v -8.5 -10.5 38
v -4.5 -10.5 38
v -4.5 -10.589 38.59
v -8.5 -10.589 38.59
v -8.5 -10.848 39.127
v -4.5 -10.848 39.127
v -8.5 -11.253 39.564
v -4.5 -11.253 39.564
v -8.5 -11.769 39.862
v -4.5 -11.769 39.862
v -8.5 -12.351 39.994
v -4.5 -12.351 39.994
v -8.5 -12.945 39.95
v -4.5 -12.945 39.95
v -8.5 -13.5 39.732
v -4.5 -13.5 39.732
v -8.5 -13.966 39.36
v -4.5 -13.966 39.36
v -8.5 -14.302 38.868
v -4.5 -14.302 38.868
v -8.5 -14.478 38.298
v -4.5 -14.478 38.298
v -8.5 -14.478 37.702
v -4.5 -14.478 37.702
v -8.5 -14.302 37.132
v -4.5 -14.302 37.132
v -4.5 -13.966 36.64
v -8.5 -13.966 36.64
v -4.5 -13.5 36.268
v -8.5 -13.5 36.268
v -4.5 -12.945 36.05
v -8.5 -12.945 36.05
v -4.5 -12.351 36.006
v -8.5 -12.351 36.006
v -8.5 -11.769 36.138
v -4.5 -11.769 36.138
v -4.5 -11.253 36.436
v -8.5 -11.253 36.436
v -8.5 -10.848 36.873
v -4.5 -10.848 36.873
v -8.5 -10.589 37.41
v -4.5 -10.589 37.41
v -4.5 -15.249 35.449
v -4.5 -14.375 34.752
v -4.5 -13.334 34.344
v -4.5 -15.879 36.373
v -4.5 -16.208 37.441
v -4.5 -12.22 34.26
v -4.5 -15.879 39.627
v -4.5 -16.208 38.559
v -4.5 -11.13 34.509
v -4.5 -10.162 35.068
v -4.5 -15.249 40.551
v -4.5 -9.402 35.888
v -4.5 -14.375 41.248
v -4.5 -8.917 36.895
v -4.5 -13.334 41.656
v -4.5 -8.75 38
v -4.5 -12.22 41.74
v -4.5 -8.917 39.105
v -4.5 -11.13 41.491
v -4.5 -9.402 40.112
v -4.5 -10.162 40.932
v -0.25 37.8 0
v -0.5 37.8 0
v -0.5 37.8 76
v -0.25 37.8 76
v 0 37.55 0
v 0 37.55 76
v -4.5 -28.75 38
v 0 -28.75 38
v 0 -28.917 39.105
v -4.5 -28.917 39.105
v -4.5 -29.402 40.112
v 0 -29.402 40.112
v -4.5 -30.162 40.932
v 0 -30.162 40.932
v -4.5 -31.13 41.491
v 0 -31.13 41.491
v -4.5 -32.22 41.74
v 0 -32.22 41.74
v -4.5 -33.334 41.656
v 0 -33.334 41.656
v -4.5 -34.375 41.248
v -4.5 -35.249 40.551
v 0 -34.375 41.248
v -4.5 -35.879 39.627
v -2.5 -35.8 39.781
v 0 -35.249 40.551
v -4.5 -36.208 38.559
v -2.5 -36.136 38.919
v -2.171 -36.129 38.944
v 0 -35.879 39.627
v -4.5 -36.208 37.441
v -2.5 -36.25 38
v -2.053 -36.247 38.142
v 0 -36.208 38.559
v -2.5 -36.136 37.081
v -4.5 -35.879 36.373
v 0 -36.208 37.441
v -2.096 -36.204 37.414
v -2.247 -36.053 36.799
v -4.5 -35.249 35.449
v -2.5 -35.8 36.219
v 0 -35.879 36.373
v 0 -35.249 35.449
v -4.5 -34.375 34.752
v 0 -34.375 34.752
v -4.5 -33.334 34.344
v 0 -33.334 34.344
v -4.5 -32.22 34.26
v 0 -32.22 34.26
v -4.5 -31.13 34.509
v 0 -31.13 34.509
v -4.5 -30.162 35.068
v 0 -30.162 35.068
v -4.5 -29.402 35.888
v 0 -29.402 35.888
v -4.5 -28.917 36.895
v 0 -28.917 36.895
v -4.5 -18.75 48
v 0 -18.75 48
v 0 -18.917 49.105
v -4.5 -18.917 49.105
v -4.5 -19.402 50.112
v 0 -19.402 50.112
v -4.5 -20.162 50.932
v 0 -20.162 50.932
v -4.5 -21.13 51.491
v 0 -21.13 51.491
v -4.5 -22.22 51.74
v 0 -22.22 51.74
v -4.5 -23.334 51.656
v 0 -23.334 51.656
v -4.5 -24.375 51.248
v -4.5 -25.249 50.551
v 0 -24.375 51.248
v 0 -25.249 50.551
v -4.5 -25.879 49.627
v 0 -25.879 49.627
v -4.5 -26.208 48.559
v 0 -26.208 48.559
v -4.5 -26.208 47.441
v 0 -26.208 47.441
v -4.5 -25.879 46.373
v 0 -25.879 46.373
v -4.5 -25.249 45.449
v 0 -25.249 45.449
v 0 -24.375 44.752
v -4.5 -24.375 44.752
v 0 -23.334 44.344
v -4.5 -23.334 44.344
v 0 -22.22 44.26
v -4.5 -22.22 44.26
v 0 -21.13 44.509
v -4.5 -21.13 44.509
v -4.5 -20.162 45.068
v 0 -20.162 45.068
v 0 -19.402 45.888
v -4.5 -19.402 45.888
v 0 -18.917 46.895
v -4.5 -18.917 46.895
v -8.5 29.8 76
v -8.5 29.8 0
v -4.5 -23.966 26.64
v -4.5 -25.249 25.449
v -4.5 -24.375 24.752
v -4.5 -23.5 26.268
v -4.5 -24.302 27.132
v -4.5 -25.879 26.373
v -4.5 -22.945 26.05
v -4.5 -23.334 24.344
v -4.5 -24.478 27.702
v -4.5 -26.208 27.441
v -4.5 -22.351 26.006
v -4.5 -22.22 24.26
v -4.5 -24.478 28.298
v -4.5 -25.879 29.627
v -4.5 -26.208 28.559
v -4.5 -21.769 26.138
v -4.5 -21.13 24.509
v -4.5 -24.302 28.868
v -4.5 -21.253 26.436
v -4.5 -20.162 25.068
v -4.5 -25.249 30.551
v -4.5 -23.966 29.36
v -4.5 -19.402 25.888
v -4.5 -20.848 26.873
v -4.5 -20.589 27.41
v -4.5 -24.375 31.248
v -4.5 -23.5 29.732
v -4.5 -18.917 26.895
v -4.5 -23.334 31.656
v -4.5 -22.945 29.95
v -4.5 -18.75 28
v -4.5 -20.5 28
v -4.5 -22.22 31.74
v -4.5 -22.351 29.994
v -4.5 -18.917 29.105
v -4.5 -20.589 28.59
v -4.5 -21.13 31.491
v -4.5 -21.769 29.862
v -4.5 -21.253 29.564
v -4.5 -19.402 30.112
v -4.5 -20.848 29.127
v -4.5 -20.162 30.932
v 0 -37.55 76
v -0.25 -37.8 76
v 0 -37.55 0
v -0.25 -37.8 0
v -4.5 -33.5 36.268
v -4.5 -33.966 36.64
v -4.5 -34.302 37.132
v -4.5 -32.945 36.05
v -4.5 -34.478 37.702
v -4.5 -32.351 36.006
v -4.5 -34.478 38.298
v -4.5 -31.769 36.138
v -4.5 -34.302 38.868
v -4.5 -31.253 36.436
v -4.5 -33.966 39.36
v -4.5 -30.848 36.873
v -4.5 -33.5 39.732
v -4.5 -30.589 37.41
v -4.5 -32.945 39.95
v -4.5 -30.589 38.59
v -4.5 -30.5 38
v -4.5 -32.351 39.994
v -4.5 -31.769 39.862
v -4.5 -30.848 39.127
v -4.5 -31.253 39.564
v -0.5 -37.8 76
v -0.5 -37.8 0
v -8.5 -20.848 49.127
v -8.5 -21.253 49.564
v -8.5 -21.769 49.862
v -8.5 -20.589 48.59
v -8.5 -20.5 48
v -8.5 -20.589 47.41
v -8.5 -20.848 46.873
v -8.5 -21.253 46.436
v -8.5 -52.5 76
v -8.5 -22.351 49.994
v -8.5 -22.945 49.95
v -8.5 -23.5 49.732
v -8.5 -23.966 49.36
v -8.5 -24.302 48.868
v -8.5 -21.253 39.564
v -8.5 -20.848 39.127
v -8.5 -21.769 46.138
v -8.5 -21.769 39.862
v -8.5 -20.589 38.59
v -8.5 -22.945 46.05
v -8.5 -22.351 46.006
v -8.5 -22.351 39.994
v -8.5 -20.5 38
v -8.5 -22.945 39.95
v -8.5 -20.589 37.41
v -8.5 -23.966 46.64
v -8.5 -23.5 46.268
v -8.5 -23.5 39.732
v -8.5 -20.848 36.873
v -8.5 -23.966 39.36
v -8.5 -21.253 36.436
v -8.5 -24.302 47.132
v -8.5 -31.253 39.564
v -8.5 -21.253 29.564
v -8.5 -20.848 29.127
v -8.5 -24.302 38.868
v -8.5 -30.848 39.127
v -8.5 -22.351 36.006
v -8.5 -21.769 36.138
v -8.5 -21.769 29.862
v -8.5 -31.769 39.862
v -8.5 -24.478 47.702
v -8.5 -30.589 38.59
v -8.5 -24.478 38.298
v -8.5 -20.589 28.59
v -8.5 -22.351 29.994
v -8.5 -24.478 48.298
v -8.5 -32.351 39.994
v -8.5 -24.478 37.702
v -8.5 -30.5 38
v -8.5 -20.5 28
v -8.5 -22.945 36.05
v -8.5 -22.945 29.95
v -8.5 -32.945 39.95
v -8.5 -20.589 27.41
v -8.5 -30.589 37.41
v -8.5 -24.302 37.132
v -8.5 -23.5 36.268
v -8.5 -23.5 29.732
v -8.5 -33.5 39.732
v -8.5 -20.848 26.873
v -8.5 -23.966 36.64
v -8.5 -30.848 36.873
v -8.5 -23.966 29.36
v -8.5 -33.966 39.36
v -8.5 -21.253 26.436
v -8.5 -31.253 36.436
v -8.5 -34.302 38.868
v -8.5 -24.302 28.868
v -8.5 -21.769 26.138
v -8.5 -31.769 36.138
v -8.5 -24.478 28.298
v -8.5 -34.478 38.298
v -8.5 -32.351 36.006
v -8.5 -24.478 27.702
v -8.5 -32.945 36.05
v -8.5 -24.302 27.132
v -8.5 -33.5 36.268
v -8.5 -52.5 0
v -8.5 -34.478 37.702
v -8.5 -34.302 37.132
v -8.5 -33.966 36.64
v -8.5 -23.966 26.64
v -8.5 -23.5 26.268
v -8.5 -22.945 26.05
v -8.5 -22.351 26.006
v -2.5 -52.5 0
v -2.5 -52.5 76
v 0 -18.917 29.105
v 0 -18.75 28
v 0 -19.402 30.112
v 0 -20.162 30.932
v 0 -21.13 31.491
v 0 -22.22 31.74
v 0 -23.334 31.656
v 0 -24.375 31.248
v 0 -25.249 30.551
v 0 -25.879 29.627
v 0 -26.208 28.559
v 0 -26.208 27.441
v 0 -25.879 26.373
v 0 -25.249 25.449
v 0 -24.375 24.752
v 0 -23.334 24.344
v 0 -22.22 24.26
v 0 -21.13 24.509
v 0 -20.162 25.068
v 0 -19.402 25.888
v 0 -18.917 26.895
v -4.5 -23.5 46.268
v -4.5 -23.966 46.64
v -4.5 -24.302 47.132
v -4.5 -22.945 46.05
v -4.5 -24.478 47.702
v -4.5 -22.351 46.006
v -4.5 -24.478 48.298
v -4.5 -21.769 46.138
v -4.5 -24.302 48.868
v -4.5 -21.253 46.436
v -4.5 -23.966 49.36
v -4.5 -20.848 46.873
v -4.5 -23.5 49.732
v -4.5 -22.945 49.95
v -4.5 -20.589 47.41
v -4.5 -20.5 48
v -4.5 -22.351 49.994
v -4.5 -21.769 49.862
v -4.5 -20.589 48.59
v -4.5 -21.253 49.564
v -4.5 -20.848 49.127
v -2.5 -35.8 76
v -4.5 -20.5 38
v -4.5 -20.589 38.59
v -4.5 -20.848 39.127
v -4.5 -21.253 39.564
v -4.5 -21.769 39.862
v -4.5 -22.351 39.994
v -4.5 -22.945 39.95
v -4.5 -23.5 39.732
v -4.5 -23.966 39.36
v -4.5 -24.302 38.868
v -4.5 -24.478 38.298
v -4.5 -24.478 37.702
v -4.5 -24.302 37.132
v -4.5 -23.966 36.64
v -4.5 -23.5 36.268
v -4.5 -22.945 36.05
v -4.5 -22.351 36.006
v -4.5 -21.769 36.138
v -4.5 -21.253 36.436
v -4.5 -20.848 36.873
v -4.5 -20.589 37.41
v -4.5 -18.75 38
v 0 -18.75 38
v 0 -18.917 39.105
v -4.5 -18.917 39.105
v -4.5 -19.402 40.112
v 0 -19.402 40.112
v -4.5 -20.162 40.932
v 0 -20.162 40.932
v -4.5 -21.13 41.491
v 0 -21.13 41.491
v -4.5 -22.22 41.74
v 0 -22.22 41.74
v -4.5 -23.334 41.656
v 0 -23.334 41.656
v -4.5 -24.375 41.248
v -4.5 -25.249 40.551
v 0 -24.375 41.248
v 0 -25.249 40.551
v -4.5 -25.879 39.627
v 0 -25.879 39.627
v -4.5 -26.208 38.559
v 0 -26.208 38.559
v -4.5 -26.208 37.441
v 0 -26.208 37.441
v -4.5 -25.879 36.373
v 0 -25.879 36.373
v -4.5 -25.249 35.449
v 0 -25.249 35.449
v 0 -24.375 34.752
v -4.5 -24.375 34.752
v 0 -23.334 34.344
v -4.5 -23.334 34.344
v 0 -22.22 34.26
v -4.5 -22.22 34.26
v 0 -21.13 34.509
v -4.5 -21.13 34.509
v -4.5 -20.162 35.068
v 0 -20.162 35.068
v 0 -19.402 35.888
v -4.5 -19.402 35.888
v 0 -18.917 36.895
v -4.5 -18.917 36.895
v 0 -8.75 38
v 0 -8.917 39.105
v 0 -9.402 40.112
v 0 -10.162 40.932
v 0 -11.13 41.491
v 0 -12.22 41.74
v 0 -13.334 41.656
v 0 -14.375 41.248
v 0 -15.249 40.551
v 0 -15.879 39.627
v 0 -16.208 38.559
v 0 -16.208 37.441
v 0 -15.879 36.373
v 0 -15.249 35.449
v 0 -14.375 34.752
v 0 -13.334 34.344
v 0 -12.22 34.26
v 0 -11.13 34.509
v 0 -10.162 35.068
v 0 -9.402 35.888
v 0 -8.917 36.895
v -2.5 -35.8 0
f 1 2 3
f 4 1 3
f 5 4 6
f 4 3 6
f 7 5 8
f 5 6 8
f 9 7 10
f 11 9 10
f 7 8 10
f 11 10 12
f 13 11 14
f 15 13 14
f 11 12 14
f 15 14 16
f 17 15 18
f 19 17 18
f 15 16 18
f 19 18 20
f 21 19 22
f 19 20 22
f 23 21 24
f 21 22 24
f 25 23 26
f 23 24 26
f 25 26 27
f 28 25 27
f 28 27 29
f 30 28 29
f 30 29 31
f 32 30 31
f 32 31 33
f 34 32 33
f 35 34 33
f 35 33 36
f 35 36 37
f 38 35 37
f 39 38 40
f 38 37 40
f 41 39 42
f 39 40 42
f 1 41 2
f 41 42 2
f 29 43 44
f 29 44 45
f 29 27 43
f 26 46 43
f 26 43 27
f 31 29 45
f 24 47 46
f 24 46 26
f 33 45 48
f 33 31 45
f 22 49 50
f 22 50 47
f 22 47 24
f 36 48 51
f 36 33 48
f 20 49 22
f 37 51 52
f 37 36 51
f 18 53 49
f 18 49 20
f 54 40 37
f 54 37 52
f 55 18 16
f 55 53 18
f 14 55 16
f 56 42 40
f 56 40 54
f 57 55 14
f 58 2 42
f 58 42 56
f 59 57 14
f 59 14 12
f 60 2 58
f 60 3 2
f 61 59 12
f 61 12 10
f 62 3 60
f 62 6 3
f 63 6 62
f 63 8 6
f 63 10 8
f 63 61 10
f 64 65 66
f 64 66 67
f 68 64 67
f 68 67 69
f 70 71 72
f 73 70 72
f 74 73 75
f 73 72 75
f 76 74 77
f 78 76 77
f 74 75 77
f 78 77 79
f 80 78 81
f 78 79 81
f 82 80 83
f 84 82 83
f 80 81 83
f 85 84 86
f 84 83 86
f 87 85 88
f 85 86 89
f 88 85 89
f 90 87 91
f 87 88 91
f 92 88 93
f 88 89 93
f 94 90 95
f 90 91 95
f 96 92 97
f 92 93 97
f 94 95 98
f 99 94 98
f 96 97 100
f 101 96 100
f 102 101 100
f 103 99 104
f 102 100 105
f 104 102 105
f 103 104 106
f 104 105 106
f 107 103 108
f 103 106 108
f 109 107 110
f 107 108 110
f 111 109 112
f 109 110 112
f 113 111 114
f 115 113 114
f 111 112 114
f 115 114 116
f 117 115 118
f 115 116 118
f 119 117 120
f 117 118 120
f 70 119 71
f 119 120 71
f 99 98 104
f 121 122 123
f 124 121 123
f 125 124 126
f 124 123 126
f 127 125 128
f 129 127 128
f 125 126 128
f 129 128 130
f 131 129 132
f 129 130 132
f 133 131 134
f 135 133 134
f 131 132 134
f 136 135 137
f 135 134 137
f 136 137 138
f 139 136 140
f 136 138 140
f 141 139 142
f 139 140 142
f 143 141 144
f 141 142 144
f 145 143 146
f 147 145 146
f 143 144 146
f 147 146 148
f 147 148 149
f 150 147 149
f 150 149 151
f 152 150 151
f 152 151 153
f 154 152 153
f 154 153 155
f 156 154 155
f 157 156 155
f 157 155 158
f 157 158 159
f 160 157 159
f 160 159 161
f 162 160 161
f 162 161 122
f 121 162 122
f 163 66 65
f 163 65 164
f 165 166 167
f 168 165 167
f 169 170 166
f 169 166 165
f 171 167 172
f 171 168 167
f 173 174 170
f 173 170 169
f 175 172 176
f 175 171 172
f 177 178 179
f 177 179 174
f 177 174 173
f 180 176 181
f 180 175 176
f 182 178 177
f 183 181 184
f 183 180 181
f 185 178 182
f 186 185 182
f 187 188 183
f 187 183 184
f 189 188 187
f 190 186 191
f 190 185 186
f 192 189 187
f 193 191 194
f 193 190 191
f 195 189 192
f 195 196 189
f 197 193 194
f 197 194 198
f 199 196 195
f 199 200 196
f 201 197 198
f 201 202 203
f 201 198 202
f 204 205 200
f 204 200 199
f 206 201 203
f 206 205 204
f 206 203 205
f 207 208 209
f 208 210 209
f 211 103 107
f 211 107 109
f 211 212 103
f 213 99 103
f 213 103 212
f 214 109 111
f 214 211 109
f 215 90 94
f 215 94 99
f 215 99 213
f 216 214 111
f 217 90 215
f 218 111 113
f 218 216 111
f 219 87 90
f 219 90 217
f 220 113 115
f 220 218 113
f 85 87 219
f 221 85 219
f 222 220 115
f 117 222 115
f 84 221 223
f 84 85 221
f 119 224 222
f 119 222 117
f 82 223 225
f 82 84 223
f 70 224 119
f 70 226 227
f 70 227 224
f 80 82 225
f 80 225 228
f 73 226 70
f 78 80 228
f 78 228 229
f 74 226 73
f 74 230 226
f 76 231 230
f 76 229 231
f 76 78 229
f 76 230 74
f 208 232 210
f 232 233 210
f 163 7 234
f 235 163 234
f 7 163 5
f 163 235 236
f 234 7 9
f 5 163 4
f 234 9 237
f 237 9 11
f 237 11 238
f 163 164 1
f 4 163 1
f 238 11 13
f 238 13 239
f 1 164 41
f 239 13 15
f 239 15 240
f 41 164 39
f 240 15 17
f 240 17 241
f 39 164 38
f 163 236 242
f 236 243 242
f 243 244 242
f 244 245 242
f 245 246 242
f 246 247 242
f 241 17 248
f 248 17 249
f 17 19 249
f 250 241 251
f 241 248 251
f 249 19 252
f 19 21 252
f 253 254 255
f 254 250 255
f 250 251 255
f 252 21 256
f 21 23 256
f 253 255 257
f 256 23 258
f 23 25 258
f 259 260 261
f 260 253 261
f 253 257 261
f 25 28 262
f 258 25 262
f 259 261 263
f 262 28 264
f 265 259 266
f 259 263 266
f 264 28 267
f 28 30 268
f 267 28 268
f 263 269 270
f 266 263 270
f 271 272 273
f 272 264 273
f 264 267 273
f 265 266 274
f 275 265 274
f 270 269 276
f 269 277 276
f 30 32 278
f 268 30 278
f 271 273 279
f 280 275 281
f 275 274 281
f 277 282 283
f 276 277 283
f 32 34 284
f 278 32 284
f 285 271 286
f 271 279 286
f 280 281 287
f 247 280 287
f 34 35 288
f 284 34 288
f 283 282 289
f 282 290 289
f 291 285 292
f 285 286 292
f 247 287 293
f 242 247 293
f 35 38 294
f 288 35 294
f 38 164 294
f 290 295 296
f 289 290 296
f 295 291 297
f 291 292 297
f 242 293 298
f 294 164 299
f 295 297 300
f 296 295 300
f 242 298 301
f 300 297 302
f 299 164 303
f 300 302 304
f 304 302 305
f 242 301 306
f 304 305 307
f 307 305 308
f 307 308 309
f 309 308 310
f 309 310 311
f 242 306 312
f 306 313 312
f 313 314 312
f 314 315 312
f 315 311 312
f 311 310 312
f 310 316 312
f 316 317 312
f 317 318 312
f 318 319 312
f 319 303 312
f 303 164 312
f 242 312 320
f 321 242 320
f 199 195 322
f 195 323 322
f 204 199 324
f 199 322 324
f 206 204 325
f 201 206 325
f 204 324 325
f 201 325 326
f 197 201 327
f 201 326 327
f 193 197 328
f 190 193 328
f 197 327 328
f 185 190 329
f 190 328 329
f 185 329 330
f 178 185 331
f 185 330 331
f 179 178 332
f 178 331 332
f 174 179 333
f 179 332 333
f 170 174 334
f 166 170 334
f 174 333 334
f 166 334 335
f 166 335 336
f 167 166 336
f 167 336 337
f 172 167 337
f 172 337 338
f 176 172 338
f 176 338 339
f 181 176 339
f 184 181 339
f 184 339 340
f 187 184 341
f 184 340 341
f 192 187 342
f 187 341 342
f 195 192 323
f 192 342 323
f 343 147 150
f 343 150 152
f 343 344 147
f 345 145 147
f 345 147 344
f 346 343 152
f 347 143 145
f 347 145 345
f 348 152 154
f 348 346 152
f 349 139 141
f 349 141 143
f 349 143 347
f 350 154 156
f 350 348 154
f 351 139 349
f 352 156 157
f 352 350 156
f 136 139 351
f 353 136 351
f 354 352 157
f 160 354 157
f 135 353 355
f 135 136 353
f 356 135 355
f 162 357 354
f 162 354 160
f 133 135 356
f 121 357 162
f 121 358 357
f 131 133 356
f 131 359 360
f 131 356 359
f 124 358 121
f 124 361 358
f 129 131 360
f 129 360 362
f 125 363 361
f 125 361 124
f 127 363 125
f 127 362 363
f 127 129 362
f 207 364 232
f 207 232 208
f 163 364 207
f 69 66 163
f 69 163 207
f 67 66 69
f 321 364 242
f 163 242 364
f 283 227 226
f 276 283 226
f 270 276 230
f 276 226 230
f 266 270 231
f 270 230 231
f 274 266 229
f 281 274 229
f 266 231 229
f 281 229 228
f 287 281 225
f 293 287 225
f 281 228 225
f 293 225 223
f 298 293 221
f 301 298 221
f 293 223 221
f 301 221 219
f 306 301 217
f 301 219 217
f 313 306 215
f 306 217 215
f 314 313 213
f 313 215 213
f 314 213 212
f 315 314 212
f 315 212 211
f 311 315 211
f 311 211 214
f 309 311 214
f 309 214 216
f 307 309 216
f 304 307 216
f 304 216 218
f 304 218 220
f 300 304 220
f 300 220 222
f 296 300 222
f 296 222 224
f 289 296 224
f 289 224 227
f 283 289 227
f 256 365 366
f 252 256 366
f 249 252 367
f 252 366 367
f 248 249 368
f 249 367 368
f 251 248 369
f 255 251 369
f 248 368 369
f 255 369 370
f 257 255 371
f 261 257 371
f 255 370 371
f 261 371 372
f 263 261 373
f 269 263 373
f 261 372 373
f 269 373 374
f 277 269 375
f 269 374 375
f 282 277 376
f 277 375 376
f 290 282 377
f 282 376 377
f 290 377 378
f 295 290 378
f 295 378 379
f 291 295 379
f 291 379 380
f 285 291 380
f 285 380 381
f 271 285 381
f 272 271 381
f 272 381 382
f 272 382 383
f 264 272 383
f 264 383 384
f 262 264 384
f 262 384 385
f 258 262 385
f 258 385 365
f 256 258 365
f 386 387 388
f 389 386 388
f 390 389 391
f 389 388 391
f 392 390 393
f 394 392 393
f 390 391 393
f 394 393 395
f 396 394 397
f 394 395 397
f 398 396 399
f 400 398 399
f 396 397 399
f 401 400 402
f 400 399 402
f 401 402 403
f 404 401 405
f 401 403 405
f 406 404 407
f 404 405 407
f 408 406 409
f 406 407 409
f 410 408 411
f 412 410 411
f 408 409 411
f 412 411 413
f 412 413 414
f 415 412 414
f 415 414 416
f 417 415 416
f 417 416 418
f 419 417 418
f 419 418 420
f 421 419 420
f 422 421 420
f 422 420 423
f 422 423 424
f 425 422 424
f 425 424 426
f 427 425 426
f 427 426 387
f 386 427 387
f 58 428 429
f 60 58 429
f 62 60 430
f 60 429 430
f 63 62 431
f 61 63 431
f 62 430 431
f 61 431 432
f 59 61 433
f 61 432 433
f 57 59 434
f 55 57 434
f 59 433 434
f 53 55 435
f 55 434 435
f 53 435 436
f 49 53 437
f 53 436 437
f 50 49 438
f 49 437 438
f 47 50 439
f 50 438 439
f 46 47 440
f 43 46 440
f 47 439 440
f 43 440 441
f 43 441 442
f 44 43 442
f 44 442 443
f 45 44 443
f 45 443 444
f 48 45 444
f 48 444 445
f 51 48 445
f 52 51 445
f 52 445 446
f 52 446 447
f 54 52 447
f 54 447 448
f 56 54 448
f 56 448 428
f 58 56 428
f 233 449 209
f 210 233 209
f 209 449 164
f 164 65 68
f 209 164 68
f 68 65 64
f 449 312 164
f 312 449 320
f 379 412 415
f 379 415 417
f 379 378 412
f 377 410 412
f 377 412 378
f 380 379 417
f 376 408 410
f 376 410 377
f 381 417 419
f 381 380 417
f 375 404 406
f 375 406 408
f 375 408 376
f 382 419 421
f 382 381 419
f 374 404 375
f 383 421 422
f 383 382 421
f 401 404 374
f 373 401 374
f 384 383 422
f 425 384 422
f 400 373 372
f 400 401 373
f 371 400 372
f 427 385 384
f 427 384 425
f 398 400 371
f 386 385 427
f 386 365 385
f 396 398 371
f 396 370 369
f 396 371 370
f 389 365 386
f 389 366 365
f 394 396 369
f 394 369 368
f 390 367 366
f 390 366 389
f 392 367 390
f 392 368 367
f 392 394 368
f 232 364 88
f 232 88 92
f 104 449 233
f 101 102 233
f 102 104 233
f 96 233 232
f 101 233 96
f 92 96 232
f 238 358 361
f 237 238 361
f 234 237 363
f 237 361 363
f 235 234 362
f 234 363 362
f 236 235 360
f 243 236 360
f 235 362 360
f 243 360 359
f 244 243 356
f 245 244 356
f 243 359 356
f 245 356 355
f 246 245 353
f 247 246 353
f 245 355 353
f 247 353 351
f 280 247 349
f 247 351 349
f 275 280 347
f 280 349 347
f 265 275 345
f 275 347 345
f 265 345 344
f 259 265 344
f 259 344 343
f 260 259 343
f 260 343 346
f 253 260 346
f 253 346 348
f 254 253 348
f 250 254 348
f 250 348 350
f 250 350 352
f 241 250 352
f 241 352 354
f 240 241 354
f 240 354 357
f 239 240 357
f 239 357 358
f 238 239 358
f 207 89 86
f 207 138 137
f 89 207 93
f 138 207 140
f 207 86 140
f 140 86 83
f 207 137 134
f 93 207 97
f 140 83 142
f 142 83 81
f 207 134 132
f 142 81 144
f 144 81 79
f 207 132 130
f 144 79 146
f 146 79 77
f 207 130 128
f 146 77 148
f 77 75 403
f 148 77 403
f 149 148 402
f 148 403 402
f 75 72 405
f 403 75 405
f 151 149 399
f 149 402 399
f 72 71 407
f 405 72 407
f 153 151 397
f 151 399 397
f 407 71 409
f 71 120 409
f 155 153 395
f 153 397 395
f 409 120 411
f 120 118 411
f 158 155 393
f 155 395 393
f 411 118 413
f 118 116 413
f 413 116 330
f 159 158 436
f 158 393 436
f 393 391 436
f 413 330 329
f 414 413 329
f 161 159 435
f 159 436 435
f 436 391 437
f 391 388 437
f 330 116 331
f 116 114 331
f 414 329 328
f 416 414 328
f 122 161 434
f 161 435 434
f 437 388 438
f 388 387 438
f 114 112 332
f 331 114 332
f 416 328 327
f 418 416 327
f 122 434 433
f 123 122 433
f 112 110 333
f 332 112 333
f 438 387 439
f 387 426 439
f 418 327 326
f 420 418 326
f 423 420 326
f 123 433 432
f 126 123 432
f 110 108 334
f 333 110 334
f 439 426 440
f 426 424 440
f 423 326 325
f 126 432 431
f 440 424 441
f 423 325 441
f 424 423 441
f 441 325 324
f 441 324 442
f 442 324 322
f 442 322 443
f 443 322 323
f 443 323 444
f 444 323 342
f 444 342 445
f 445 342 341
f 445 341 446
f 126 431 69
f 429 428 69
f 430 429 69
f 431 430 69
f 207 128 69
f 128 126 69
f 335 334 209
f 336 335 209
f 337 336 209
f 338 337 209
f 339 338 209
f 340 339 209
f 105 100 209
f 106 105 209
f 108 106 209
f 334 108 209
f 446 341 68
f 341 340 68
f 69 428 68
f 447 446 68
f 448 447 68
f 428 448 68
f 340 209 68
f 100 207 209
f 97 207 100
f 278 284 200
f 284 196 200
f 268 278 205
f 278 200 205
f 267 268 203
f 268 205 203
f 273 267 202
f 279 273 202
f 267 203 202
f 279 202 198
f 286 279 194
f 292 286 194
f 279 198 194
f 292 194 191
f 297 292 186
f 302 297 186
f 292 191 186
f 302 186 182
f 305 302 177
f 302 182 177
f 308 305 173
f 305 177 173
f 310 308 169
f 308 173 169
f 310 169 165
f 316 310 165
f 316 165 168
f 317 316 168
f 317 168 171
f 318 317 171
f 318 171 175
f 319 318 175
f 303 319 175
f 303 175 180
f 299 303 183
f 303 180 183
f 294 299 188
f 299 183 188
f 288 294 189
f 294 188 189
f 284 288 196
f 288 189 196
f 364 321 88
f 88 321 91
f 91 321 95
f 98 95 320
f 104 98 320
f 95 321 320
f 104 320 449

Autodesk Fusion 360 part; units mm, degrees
sketch "Skizze1" plane through (0, 0, 0) normal (0, 0, 1) x (1, 0, 0)
  line L0 (-2.5, 19.7043) -> (-8.5, 19.7043)
  line L1 (-8.5, 19.7043) -> (-8.5, -52.5)
  line L2 (-8.5, -52.5) -> (-2.5, -52.5)
  line L3 (-2.5, -52.5) -> (-2.5, -35.8)
  line L4 (-2.5, -35.8) -> (0, -38.3)
  line L5 (0, -38.3) -> (0, 38.3)
  line L6 (0, 38.3) -> (-2.5, 35.8)
  line L7 (-2.5, 35.8) -> (-2.5, 19.7043)
  line L8 (-2.5, 35.8) -> (-8.5, 29.8)
  line L9 (-8.5, 29.8) -> (-8.5, 19.7043)
  line L10 (-0.5, 37.8) -> (-0.25, 37.8)
  line L11 (-0.25, 37.8) -> (0, 37.55)
  line L12 (0, 0) -> (7.5514, 0) construction
  line L13 (-0.5, -37.8) -> (-0.25, -37.8)
  line L14 (-0.25, -37.8) -> (0, -37.55)
  dimension "d1" = 45
  dimension "d2" = 2.5
  dimension "d6" = 52.5
  dimension "d31" = 8.5
  dimension "d33" = 16.7
  dimension "d34" = 0.25
  dimension "d36" = 0.25
  dimension "d37" = 82.3
extrude "Extrusion1" add sketch "Skizze1" along normal blind 76 contours L0 L1 L2 L3 L4 L5 L6 L7 L10 L11 L13 L14 | L0 L7 L8 L9
sketch "Skizze2" plane through (0, 0, 0) normal (1, 0, 0) x (0, 1, 0)
  line L0 (-37.55, 0) -> (37.55, 0)
  line L1 (37.55, 76) -> (-37.55, 76)
  line L2 (0, 38) -> (-32.5, 38) construction
  circle A0 centre (-12.5, 38) radius 2
  circle A1 centre (-32.5, 38) radius 2
  circle A2 centre (-22.5, 48) radius 2
  circle A3 centre (-22.5, 28) radius 2
  line L3 (-32.5, 38) -> (-12.5, 38) construction
  line L4 (-22.5, 38) -> (-22.5, 48) construction
  circle A4 centre (-22.5, 38) radius 2
  circle A5 centre (-12.5, 38) radius 3.75
  circle A6 centre (-22.5, 48) radius 3.75
  circle A7 centre (-22.5, 28) radius 3.75
  circle A8 centre (-32.5, 38) radius 3.75
  circle A9 centre (-22.5, 38) radius 3.75
  line L5 (37.55, 0) -> (37.55, 76)
  line L6 (-37.55, 76) -> (-37.55, 0)
  line L7 (0, 76) -> (0, 0) construction
  dimension "d9" = 4
  dimension "d11" = 4
  dimension "d12" = 4
  dimension "d13" = 4
  dimension "d14" = 20
  dimension "d15" = 10
  dimension "d16" = 4
  dimension "d19" = 7.5
  dimension "d20" = 7.5
  dimension "d21" = 7.5
  dimension "d22" = 7.5
  dimension "d23" = 7.5
  dimension "d32" = 12.5
extrude "Extrusion3" cut sketch "Skizze2" against normal blind 4.5 contours A5 | A6 | A7 | A8 | A9
extrude "Extrusion2" cut sketch "Skizze2" against normal up to surface (8.5 mm away) contours A0 | A1 | A2 | A3 | A4
equation "d6 = 12.5 mm + 20 mm + 20 mm"
equation "d11 = d9"
equation "d12 = d9"
equation "d13 = d9"
equation "d16 = d9"
equation "d20 = d19"
equation "d21 = d19"
equation "d22 = d19"
equation "d23 = d19"
